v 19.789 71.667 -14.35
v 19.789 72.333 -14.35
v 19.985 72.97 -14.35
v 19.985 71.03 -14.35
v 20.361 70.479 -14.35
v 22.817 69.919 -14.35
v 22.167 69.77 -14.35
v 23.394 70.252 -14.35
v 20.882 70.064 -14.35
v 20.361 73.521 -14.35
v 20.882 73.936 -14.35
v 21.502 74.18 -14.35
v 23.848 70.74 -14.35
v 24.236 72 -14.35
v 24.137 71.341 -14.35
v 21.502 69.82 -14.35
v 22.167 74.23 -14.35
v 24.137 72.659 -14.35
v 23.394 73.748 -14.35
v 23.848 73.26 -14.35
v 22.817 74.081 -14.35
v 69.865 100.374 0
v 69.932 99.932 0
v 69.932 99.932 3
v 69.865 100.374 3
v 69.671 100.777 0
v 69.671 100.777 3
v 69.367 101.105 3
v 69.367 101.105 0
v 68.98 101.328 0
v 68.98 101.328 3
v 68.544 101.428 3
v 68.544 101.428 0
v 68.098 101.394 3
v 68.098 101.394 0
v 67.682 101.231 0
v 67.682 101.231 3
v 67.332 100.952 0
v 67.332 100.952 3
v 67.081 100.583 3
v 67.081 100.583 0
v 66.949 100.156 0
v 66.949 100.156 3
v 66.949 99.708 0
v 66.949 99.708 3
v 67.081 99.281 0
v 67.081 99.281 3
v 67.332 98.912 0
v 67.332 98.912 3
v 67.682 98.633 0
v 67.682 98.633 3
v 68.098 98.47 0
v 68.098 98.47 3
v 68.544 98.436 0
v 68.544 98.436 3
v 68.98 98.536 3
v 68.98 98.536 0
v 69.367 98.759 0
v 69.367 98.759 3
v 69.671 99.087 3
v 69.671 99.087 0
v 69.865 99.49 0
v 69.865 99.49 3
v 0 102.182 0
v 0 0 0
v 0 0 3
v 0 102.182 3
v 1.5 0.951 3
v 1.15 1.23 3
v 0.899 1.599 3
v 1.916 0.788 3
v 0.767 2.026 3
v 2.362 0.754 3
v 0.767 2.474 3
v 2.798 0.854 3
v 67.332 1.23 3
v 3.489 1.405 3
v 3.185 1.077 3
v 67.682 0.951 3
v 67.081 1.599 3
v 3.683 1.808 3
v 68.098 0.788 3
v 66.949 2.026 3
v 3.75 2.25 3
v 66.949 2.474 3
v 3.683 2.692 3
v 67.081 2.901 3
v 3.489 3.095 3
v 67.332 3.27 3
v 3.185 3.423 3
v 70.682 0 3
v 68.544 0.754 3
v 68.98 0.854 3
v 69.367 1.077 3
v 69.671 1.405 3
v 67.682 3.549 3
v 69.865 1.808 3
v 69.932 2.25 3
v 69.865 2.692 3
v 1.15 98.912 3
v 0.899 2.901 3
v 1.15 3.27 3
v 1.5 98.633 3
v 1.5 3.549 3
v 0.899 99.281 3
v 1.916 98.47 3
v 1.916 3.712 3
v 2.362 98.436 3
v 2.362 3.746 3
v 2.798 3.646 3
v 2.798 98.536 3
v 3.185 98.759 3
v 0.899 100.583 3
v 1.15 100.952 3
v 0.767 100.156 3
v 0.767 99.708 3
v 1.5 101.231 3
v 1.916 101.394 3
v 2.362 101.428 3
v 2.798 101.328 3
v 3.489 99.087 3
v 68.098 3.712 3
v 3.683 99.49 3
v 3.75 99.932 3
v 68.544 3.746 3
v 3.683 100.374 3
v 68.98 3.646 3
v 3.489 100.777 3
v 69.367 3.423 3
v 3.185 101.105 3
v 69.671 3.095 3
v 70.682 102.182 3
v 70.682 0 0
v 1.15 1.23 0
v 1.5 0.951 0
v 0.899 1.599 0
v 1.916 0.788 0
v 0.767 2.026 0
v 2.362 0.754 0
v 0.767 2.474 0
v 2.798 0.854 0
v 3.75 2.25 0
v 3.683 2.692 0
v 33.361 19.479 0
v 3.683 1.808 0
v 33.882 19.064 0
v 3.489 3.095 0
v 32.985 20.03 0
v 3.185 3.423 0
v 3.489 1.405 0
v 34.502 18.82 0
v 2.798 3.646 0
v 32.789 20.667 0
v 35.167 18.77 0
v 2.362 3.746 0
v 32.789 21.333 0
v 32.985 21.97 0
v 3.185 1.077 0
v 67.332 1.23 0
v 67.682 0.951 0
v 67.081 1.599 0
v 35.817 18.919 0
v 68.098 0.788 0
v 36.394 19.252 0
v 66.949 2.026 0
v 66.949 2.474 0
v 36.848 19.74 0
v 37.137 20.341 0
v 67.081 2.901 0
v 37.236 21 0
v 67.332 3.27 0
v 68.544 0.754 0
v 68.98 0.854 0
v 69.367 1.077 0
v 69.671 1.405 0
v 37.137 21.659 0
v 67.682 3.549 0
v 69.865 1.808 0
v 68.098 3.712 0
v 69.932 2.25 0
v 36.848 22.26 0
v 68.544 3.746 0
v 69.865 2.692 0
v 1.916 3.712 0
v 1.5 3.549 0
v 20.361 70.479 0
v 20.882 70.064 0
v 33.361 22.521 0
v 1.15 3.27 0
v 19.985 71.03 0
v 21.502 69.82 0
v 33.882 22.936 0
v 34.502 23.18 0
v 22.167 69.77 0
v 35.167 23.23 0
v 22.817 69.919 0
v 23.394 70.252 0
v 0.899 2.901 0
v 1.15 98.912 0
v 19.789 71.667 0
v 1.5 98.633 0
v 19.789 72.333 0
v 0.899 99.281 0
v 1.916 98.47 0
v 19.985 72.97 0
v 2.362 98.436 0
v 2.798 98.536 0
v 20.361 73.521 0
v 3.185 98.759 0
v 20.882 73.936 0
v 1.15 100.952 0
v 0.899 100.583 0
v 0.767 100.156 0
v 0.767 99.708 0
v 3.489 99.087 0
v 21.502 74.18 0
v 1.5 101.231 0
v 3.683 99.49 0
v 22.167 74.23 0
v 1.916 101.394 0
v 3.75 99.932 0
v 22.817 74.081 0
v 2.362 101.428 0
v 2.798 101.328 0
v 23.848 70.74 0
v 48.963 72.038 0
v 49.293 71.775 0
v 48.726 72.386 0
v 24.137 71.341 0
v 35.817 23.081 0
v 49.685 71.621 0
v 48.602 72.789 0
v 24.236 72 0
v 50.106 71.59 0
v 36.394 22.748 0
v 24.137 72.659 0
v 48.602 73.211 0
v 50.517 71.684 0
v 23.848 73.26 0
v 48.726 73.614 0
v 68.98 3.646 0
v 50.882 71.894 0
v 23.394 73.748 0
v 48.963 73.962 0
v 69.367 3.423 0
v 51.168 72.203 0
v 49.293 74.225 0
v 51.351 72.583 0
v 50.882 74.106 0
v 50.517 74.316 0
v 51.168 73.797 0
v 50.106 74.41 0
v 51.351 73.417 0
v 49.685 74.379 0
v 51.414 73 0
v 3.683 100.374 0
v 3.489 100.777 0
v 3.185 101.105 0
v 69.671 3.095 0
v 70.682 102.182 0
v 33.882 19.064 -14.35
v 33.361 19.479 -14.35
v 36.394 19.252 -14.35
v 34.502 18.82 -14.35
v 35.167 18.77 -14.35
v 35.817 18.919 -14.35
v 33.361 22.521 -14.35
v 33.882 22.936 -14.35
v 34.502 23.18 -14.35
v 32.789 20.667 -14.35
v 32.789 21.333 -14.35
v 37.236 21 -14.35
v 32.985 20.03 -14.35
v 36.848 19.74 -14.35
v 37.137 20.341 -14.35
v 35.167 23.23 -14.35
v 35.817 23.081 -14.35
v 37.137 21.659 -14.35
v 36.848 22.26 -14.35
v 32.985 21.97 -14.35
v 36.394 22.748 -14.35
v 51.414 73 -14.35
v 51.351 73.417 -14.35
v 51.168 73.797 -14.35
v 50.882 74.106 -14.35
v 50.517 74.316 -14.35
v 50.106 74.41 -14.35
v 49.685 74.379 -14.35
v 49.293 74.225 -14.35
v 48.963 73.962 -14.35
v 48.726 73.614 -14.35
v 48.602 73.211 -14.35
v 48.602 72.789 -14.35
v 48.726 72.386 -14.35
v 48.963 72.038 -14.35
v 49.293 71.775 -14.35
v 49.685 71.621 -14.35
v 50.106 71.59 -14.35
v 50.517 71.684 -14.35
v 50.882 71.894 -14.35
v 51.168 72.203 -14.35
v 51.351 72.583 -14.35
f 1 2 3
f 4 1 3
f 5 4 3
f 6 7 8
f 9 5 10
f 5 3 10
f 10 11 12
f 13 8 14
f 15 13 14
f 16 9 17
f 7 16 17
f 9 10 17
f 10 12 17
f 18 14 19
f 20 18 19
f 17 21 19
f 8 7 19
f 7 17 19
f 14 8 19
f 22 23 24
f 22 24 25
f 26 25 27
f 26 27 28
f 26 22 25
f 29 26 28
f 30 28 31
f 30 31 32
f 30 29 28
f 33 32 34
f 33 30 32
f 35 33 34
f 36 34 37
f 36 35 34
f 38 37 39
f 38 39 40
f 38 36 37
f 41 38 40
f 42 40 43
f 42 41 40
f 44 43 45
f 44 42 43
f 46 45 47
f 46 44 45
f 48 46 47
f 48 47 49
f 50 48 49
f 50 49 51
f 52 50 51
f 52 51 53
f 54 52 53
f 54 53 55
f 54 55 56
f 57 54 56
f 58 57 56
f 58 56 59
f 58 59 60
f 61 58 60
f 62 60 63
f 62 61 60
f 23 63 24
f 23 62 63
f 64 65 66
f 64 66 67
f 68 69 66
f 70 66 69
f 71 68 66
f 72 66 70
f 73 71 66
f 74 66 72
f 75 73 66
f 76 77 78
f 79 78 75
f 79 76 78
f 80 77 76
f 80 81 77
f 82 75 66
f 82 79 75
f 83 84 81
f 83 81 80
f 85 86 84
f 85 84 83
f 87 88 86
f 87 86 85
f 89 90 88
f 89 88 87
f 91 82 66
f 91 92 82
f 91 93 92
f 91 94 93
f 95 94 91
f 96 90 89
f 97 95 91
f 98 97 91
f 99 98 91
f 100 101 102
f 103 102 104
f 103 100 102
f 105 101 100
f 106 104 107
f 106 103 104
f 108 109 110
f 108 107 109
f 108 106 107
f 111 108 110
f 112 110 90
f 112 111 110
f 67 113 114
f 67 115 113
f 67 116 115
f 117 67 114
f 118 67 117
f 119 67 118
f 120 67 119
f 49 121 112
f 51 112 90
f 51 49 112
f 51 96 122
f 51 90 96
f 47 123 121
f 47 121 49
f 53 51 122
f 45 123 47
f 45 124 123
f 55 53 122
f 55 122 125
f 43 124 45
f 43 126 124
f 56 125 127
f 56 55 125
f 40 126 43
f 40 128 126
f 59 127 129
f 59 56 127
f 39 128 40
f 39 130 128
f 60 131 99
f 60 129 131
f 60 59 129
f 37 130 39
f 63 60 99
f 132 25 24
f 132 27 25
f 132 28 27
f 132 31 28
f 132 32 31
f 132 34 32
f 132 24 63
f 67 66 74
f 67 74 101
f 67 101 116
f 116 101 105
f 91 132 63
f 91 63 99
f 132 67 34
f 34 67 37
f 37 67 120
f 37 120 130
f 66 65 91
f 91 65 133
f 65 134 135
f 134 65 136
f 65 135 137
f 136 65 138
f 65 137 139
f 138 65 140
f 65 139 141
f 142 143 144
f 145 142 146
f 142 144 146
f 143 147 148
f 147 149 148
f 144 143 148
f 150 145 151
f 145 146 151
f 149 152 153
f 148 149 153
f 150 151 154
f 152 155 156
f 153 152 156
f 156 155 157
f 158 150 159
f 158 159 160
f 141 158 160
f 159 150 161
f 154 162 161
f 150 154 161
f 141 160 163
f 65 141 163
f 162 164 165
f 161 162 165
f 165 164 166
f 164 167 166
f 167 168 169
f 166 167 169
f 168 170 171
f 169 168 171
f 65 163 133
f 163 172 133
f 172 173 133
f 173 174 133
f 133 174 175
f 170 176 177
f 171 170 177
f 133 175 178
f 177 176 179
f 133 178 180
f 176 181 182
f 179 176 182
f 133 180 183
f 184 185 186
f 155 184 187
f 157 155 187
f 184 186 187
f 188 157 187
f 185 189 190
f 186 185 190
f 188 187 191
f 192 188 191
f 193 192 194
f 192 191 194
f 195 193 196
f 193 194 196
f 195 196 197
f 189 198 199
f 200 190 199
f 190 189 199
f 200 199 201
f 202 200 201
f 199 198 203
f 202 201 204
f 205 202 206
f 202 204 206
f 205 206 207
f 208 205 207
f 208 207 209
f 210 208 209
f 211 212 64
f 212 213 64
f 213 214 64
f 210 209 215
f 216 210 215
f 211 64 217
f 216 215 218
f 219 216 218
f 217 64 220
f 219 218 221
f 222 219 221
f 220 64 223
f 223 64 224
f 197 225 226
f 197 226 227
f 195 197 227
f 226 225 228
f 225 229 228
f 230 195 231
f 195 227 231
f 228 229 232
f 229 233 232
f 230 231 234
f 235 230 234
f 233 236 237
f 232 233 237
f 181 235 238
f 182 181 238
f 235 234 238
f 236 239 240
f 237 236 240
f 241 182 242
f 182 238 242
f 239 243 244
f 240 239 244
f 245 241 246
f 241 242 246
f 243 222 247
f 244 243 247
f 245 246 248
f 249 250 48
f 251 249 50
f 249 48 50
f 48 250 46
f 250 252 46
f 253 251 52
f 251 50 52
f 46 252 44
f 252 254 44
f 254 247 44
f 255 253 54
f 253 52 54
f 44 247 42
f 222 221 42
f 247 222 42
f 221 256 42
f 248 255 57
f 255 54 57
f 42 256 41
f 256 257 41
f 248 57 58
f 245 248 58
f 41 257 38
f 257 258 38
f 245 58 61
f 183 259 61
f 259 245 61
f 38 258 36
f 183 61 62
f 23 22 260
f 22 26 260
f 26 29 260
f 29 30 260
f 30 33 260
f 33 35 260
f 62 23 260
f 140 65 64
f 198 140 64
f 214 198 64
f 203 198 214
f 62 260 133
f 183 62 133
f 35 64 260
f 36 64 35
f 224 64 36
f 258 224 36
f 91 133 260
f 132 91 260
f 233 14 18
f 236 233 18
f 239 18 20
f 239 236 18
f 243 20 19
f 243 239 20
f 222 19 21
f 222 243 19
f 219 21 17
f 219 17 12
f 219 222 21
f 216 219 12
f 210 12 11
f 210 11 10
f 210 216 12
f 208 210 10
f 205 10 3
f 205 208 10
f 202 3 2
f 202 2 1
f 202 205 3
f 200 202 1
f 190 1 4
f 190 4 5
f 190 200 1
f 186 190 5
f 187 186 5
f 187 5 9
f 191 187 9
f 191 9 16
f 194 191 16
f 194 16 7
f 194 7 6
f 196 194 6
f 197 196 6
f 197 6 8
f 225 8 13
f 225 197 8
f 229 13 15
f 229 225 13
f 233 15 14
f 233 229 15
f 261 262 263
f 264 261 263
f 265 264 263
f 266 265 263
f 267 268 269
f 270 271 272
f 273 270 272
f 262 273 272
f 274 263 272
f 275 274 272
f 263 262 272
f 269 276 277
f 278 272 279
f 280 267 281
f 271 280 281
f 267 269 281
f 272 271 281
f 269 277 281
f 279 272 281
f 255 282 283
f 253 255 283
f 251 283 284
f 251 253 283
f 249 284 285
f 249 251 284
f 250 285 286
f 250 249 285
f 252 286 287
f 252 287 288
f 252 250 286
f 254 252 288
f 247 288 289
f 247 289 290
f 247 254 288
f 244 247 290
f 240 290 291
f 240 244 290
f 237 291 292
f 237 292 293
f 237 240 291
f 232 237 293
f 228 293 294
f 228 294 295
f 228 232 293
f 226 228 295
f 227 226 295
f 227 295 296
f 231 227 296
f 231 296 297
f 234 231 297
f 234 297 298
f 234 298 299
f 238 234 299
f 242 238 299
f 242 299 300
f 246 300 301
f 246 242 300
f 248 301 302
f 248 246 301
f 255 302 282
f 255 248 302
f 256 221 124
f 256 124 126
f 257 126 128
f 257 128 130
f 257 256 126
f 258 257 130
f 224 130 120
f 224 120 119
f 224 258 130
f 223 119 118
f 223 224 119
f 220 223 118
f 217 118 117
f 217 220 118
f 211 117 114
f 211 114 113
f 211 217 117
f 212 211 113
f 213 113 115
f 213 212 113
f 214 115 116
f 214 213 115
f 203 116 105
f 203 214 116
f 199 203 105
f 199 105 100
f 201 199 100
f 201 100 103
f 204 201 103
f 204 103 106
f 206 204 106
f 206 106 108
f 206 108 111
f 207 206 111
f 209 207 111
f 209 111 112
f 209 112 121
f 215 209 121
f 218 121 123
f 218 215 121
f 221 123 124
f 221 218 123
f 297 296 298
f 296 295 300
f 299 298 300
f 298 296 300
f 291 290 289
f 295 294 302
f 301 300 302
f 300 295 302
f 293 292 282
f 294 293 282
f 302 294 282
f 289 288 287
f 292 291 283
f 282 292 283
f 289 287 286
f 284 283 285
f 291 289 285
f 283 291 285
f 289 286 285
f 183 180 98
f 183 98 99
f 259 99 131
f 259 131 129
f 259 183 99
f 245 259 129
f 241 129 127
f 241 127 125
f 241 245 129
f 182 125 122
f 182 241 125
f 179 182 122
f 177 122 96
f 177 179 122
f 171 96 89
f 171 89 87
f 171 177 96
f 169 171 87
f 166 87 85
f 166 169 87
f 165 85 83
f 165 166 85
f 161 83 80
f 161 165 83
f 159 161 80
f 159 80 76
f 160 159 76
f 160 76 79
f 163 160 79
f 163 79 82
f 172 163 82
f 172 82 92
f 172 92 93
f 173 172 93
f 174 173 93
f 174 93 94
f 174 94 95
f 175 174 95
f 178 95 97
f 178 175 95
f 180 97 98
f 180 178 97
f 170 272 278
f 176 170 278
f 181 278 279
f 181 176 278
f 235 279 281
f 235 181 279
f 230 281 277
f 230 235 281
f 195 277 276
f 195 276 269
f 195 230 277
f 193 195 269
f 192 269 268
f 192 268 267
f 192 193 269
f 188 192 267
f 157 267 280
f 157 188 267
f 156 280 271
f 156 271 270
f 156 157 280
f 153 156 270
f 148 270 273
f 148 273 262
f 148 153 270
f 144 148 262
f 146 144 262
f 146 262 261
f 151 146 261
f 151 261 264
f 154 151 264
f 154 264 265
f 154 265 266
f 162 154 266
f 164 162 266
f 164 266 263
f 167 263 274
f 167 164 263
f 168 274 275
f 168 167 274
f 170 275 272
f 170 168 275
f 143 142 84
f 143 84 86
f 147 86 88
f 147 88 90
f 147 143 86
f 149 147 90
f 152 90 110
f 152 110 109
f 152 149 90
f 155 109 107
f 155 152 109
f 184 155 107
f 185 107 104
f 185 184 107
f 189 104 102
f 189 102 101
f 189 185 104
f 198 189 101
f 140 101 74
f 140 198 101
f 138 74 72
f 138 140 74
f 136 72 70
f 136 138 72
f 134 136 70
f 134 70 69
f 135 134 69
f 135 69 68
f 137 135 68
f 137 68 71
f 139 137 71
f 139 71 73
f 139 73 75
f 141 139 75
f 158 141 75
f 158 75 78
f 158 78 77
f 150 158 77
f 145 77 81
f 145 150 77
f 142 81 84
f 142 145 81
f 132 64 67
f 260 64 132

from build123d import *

# Parameters (mm, degrees)
SKETCH1_W           = 70.681980515
SKETCH1_H           = 102.181980515
SKETCH1_R           = 1.5
BOSS_EXTRUDE2_DEPTH = 3
SKETCH1_27_R        = 2.236067977
SKETCH1_27_R_2      = 1.414213562
BOSS_EXTRUDE3_DEPTH = 14.35


with BuildPart() as part:
    # Sketch1 → Boss-Extrude2 (new body)
    with BuildSketch(Plane.XY):
        with Locations((35.340990258, 51.090990258)):
            Rectangle(SKETCH1_W, SKETCH1_H)
        with Locations((68.431980515, 2.25)):
            Circle(SKETCH1_R, mode=Mode.SUBTRACT)
        with Locations((2.25, 99.931980515)):
            Circle(SKETCH1_R, mode=Mode.SUBTRACT)
        with Locations((68.431980515, 99.931980515)):
            Circle(SKETCH1_R, mode=Mode.SUBTRACT)
        with Locations((2.25, 2.25)):
            Circle(SKETCH1_R, mode=Mode.SUBTRACT)
    extrude(amount=BOSS_EXTRUDE2_DEPTH)

    # Sketch1<27> → Boss-Extrude3 (add)
    with BuildSketch(Plane.XY):
        with Locations((35, 21)):
            Circle(SKETCH1_27_R)
        with Locations((50, 73)):
            Circle(SKETCH1_27_R_2)
        with Locations((22, 72)):
            Circle(SKETCH1_27_R)
    extrude(amount=-BOSS_EXTRUDE3_DEPTH)


solid = part.part
